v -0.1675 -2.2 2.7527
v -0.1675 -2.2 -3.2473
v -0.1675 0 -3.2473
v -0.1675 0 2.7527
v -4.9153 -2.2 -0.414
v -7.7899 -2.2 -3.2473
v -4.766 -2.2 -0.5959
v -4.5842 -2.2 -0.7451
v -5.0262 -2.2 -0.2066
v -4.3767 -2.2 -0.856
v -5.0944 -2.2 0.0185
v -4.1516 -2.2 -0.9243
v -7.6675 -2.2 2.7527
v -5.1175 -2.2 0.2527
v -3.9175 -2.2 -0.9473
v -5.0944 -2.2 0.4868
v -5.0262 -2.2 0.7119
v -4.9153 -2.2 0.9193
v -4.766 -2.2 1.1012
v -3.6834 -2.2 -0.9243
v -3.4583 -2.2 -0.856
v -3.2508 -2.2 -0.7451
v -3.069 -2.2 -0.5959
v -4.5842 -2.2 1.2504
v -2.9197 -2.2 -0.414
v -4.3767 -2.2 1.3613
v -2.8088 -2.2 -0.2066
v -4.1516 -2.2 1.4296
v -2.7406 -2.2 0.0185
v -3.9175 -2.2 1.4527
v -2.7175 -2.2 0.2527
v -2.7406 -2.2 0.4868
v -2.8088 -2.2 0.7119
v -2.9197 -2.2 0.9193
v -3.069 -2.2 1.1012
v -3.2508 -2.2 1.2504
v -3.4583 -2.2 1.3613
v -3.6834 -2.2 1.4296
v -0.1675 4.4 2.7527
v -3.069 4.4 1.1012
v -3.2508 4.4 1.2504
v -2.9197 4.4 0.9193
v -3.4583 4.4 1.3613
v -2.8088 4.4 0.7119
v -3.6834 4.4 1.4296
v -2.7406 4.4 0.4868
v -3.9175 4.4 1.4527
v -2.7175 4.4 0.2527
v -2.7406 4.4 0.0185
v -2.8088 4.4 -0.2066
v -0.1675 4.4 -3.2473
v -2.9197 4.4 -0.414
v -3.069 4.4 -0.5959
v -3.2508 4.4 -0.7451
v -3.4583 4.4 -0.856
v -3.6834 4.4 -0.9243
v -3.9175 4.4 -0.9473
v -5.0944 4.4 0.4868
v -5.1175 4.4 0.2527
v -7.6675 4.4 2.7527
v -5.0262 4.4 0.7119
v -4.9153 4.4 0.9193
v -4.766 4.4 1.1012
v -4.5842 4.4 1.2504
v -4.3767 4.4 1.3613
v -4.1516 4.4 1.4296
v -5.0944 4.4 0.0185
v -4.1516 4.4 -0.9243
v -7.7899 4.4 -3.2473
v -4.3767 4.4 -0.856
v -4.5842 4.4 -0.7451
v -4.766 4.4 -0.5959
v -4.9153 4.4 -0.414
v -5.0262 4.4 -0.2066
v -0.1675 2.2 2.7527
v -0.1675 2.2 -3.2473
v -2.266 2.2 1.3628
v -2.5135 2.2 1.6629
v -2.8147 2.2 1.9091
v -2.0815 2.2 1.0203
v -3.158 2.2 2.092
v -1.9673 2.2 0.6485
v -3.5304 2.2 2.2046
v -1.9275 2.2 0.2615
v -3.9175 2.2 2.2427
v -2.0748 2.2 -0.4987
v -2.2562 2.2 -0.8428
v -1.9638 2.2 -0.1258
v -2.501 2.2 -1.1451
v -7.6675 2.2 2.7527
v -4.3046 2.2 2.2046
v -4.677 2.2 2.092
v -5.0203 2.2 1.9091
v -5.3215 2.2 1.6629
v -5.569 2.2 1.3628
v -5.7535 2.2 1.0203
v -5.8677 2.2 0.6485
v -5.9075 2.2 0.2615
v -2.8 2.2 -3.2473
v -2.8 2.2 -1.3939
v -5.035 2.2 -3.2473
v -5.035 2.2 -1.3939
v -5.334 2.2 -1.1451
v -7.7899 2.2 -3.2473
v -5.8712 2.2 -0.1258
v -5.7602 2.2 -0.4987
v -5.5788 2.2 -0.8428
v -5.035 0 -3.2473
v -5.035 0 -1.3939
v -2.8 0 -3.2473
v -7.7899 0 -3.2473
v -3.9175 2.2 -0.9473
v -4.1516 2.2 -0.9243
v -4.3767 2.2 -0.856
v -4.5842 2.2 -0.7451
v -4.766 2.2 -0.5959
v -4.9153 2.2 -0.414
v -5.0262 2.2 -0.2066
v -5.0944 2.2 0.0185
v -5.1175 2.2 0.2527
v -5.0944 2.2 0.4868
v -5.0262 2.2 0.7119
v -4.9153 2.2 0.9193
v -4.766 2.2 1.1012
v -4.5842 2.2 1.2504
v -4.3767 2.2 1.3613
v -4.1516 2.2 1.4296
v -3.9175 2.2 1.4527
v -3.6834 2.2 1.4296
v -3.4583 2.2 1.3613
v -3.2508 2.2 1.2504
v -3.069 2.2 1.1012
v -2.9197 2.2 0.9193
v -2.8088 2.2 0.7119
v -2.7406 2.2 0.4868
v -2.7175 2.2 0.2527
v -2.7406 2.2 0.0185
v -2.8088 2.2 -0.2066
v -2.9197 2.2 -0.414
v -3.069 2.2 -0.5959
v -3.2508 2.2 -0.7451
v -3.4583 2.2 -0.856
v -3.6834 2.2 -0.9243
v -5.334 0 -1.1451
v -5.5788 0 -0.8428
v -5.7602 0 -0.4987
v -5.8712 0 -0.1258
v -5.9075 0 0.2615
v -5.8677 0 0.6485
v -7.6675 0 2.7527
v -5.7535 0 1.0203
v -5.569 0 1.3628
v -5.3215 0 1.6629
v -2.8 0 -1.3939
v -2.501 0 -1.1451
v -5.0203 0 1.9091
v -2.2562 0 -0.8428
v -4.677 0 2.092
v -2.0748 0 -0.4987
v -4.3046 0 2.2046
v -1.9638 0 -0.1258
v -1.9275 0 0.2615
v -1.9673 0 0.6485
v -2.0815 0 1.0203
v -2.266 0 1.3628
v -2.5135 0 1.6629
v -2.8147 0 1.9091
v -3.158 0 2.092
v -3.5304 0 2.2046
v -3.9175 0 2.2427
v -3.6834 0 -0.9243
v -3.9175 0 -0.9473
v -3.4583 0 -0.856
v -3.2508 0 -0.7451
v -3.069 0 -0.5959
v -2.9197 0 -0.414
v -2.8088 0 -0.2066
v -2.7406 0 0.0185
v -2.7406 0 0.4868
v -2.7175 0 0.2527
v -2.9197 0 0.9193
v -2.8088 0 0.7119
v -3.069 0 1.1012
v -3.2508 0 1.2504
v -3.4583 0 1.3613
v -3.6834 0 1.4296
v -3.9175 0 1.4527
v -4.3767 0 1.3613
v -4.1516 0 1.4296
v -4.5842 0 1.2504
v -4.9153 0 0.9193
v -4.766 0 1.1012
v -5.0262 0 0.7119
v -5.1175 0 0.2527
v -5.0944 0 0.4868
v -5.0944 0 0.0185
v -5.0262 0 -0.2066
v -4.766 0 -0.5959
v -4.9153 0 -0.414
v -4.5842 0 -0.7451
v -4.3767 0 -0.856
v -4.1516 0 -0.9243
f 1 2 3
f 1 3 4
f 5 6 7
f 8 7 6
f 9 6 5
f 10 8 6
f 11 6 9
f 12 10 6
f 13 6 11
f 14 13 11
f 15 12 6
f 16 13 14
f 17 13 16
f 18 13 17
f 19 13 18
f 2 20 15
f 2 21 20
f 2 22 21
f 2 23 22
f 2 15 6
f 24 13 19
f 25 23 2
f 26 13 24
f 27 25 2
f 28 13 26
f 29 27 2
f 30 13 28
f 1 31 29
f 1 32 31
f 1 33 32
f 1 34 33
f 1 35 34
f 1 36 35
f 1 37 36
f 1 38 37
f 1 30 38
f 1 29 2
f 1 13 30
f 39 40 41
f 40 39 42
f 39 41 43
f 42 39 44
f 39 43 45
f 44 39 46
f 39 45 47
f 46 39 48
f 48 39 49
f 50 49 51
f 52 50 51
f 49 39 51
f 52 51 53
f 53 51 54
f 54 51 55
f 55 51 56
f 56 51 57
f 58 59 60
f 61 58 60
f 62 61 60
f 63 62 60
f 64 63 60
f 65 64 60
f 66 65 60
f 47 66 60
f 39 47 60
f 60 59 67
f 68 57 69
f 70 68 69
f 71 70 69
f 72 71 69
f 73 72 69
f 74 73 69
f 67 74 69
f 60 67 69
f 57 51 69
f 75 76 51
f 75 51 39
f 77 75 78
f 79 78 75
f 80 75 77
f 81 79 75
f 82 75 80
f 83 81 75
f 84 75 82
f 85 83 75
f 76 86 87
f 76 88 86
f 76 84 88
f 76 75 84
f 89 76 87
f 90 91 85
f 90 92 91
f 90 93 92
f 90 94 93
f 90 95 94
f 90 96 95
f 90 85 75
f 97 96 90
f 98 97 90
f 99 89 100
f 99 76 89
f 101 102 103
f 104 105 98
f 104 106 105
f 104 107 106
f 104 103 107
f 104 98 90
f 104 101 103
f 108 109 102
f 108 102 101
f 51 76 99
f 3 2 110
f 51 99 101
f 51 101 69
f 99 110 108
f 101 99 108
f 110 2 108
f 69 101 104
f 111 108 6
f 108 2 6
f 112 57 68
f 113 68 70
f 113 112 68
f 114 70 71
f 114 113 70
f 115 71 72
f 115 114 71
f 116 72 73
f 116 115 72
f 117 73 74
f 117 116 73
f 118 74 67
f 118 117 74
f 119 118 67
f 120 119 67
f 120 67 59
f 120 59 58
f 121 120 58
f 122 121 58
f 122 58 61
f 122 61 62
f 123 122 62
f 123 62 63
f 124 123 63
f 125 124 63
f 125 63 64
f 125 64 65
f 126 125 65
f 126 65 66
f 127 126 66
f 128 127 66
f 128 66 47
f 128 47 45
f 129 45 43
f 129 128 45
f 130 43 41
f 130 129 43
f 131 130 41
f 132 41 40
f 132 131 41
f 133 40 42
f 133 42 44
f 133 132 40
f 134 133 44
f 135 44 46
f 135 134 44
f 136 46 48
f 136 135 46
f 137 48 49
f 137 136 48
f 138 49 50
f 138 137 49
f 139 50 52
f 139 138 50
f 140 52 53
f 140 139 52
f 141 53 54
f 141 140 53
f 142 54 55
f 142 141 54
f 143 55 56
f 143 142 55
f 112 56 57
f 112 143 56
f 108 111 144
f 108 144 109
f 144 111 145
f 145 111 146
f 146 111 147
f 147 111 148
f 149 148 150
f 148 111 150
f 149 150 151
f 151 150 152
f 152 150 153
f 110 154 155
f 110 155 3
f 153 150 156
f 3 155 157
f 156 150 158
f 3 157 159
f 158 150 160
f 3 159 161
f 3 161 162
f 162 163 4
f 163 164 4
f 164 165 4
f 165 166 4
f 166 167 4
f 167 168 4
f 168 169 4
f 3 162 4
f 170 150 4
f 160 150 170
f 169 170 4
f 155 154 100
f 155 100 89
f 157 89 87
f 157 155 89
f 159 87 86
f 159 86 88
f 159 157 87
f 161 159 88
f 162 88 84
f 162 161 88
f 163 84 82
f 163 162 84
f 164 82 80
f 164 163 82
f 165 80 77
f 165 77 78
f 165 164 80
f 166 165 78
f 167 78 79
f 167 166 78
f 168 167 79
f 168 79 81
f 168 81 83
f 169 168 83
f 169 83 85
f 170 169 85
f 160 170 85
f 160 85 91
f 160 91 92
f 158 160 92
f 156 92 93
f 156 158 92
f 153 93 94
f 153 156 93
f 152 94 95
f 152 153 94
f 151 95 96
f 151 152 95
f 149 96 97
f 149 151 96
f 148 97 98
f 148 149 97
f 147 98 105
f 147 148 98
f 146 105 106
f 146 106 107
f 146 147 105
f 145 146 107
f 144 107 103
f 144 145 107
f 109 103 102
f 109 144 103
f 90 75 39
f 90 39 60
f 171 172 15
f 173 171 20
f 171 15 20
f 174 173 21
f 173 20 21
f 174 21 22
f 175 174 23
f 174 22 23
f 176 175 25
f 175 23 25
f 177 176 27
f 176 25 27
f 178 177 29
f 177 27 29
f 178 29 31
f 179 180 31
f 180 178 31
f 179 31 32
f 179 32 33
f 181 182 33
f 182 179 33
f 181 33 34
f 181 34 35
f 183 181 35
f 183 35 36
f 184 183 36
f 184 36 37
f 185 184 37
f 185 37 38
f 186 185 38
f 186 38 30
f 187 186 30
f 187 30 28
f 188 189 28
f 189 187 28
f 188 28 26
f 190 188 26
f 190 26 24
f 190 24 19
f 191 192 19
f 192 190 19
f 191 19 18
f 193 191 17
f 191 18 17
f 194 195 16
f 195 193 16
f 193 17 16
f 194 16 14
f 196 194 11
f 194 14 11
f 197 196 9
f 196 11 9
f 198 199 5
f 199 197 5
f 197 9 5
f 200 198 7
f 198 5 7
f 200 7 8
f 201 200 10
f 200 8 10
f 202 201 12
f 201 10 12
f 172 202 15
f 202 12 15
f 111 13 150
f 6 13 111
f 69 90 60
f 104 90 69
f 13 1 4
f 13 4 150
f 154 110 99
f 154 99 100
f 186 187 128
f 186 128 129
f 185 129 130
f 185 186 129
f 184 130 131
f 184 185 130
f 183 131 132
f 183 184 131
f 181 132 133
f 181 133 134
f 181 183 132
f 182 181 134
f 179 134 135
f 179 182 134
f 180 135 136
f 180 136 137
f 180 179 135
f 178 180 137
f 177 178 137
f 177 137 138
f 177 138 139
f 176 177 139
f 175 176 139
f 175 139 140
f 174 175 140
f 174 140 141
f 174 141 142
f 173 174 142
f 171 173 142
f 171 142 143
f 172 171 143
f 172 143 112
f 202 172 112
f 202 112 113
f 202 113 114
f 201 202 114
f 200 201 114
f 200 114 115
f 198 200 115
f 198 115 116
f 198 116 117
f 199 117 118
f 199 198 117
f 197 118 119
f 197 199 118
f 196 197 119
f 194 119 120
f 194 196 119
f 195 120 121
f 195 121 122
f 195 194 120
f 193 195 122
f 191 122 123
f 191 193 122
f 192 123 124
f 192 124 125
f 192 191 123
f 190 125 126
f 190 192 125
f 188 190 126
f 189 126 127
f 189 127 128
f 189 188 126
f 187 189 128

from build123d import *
from build123d.topology import SkipClean

# Parameters (mm, degrees)
SKETCH1_R           = 1.2
BOSS_EXTRUDE1_DEPTH = 2.2
BOSS_EXTRUDE2_START = 2.2
SKETCH2_R           = 1.2
BOSS_EXTRUDE2_DEPTH = 2.2
SKETCH3_R           = 1.2
BOSS_EXTRUDE3_DEPTH = 2.2


with BuildPart() as part:
    # Sketch1 → Boss-Extrude1 (new body)
    with BuildSketch(Plane(origin=(0, 0, 0), x_dir=(1, 0, 0), z_dir=(0, 1, 0))):
        with BuildLine():
            Line((-5.035, 1.393945325), (-5.035, 3.24734466))
            Line((-5.035, 3.24734466), (-2.8, 3.24734466))
            Line((-2.8, 3.24734466), (-2.8, 1.393945325))
            ThreePointArc((-2.8, 1.393945325), (-3.9175, -2.24265534), (-5.035, 1.393945325))
        make_face()
        with Locations(Location((-3.9175, -0.25265534, 0), (0, 0, 270))):
            Circle(SKETCH1_R, mode=Mode.SUBTRACT)
    extrude(amount=BOSS_EXTRUDE1_DEPTH)

    # Sketch2 → Boss-Extrude2 (add)
    with SkipClean():  # the faces are left unmerged after this step: merging them gives an invalid solid
        with BuildSketch(Plane.XZ.offset(BOSS_EXTRUDE2_START)):
            Polygon((-3.9175, -3.24734466), (-0.1675, -3.24734466), (-0.1675, 2.75265534), (-7.6675, 2.75265534), (-7.789861557, -3.24734466), align=None)
            with Locations(Location((-3.9175, 0.25265534, 0), (0, 0, 270))):
                Circle(SKETCH2_R, mode=Mode.SUBTRACT)
        extrude(amount=-BOSS_EXTRUDE2_DEPTH)

    # Sketch3 → Boss-Extrude3 (add)
    with BuildSketch(Plane(origin=(0, 2.2, 0), x_dir=(1, 0, 0), z_dir=(0, 1, 0))):
        Polygon((-7.789861557, 3.24734466), (-5.035, 3.24734466), (-2.8, 3.24734466), (-0.1675, 3.24734466), (-0.1675, -2.75265534), (-7.6675, -2.75265534), align=None)
        with Locations(Location((-3.9175, -0.25265534, 0), (0, 0, 90))):
            Circle(SKETCH3_R, mode=Mode.SUBTRACT)
    extrude(amount=BOSS_EXTRUDE3_DEPTH)


solid = part.part
